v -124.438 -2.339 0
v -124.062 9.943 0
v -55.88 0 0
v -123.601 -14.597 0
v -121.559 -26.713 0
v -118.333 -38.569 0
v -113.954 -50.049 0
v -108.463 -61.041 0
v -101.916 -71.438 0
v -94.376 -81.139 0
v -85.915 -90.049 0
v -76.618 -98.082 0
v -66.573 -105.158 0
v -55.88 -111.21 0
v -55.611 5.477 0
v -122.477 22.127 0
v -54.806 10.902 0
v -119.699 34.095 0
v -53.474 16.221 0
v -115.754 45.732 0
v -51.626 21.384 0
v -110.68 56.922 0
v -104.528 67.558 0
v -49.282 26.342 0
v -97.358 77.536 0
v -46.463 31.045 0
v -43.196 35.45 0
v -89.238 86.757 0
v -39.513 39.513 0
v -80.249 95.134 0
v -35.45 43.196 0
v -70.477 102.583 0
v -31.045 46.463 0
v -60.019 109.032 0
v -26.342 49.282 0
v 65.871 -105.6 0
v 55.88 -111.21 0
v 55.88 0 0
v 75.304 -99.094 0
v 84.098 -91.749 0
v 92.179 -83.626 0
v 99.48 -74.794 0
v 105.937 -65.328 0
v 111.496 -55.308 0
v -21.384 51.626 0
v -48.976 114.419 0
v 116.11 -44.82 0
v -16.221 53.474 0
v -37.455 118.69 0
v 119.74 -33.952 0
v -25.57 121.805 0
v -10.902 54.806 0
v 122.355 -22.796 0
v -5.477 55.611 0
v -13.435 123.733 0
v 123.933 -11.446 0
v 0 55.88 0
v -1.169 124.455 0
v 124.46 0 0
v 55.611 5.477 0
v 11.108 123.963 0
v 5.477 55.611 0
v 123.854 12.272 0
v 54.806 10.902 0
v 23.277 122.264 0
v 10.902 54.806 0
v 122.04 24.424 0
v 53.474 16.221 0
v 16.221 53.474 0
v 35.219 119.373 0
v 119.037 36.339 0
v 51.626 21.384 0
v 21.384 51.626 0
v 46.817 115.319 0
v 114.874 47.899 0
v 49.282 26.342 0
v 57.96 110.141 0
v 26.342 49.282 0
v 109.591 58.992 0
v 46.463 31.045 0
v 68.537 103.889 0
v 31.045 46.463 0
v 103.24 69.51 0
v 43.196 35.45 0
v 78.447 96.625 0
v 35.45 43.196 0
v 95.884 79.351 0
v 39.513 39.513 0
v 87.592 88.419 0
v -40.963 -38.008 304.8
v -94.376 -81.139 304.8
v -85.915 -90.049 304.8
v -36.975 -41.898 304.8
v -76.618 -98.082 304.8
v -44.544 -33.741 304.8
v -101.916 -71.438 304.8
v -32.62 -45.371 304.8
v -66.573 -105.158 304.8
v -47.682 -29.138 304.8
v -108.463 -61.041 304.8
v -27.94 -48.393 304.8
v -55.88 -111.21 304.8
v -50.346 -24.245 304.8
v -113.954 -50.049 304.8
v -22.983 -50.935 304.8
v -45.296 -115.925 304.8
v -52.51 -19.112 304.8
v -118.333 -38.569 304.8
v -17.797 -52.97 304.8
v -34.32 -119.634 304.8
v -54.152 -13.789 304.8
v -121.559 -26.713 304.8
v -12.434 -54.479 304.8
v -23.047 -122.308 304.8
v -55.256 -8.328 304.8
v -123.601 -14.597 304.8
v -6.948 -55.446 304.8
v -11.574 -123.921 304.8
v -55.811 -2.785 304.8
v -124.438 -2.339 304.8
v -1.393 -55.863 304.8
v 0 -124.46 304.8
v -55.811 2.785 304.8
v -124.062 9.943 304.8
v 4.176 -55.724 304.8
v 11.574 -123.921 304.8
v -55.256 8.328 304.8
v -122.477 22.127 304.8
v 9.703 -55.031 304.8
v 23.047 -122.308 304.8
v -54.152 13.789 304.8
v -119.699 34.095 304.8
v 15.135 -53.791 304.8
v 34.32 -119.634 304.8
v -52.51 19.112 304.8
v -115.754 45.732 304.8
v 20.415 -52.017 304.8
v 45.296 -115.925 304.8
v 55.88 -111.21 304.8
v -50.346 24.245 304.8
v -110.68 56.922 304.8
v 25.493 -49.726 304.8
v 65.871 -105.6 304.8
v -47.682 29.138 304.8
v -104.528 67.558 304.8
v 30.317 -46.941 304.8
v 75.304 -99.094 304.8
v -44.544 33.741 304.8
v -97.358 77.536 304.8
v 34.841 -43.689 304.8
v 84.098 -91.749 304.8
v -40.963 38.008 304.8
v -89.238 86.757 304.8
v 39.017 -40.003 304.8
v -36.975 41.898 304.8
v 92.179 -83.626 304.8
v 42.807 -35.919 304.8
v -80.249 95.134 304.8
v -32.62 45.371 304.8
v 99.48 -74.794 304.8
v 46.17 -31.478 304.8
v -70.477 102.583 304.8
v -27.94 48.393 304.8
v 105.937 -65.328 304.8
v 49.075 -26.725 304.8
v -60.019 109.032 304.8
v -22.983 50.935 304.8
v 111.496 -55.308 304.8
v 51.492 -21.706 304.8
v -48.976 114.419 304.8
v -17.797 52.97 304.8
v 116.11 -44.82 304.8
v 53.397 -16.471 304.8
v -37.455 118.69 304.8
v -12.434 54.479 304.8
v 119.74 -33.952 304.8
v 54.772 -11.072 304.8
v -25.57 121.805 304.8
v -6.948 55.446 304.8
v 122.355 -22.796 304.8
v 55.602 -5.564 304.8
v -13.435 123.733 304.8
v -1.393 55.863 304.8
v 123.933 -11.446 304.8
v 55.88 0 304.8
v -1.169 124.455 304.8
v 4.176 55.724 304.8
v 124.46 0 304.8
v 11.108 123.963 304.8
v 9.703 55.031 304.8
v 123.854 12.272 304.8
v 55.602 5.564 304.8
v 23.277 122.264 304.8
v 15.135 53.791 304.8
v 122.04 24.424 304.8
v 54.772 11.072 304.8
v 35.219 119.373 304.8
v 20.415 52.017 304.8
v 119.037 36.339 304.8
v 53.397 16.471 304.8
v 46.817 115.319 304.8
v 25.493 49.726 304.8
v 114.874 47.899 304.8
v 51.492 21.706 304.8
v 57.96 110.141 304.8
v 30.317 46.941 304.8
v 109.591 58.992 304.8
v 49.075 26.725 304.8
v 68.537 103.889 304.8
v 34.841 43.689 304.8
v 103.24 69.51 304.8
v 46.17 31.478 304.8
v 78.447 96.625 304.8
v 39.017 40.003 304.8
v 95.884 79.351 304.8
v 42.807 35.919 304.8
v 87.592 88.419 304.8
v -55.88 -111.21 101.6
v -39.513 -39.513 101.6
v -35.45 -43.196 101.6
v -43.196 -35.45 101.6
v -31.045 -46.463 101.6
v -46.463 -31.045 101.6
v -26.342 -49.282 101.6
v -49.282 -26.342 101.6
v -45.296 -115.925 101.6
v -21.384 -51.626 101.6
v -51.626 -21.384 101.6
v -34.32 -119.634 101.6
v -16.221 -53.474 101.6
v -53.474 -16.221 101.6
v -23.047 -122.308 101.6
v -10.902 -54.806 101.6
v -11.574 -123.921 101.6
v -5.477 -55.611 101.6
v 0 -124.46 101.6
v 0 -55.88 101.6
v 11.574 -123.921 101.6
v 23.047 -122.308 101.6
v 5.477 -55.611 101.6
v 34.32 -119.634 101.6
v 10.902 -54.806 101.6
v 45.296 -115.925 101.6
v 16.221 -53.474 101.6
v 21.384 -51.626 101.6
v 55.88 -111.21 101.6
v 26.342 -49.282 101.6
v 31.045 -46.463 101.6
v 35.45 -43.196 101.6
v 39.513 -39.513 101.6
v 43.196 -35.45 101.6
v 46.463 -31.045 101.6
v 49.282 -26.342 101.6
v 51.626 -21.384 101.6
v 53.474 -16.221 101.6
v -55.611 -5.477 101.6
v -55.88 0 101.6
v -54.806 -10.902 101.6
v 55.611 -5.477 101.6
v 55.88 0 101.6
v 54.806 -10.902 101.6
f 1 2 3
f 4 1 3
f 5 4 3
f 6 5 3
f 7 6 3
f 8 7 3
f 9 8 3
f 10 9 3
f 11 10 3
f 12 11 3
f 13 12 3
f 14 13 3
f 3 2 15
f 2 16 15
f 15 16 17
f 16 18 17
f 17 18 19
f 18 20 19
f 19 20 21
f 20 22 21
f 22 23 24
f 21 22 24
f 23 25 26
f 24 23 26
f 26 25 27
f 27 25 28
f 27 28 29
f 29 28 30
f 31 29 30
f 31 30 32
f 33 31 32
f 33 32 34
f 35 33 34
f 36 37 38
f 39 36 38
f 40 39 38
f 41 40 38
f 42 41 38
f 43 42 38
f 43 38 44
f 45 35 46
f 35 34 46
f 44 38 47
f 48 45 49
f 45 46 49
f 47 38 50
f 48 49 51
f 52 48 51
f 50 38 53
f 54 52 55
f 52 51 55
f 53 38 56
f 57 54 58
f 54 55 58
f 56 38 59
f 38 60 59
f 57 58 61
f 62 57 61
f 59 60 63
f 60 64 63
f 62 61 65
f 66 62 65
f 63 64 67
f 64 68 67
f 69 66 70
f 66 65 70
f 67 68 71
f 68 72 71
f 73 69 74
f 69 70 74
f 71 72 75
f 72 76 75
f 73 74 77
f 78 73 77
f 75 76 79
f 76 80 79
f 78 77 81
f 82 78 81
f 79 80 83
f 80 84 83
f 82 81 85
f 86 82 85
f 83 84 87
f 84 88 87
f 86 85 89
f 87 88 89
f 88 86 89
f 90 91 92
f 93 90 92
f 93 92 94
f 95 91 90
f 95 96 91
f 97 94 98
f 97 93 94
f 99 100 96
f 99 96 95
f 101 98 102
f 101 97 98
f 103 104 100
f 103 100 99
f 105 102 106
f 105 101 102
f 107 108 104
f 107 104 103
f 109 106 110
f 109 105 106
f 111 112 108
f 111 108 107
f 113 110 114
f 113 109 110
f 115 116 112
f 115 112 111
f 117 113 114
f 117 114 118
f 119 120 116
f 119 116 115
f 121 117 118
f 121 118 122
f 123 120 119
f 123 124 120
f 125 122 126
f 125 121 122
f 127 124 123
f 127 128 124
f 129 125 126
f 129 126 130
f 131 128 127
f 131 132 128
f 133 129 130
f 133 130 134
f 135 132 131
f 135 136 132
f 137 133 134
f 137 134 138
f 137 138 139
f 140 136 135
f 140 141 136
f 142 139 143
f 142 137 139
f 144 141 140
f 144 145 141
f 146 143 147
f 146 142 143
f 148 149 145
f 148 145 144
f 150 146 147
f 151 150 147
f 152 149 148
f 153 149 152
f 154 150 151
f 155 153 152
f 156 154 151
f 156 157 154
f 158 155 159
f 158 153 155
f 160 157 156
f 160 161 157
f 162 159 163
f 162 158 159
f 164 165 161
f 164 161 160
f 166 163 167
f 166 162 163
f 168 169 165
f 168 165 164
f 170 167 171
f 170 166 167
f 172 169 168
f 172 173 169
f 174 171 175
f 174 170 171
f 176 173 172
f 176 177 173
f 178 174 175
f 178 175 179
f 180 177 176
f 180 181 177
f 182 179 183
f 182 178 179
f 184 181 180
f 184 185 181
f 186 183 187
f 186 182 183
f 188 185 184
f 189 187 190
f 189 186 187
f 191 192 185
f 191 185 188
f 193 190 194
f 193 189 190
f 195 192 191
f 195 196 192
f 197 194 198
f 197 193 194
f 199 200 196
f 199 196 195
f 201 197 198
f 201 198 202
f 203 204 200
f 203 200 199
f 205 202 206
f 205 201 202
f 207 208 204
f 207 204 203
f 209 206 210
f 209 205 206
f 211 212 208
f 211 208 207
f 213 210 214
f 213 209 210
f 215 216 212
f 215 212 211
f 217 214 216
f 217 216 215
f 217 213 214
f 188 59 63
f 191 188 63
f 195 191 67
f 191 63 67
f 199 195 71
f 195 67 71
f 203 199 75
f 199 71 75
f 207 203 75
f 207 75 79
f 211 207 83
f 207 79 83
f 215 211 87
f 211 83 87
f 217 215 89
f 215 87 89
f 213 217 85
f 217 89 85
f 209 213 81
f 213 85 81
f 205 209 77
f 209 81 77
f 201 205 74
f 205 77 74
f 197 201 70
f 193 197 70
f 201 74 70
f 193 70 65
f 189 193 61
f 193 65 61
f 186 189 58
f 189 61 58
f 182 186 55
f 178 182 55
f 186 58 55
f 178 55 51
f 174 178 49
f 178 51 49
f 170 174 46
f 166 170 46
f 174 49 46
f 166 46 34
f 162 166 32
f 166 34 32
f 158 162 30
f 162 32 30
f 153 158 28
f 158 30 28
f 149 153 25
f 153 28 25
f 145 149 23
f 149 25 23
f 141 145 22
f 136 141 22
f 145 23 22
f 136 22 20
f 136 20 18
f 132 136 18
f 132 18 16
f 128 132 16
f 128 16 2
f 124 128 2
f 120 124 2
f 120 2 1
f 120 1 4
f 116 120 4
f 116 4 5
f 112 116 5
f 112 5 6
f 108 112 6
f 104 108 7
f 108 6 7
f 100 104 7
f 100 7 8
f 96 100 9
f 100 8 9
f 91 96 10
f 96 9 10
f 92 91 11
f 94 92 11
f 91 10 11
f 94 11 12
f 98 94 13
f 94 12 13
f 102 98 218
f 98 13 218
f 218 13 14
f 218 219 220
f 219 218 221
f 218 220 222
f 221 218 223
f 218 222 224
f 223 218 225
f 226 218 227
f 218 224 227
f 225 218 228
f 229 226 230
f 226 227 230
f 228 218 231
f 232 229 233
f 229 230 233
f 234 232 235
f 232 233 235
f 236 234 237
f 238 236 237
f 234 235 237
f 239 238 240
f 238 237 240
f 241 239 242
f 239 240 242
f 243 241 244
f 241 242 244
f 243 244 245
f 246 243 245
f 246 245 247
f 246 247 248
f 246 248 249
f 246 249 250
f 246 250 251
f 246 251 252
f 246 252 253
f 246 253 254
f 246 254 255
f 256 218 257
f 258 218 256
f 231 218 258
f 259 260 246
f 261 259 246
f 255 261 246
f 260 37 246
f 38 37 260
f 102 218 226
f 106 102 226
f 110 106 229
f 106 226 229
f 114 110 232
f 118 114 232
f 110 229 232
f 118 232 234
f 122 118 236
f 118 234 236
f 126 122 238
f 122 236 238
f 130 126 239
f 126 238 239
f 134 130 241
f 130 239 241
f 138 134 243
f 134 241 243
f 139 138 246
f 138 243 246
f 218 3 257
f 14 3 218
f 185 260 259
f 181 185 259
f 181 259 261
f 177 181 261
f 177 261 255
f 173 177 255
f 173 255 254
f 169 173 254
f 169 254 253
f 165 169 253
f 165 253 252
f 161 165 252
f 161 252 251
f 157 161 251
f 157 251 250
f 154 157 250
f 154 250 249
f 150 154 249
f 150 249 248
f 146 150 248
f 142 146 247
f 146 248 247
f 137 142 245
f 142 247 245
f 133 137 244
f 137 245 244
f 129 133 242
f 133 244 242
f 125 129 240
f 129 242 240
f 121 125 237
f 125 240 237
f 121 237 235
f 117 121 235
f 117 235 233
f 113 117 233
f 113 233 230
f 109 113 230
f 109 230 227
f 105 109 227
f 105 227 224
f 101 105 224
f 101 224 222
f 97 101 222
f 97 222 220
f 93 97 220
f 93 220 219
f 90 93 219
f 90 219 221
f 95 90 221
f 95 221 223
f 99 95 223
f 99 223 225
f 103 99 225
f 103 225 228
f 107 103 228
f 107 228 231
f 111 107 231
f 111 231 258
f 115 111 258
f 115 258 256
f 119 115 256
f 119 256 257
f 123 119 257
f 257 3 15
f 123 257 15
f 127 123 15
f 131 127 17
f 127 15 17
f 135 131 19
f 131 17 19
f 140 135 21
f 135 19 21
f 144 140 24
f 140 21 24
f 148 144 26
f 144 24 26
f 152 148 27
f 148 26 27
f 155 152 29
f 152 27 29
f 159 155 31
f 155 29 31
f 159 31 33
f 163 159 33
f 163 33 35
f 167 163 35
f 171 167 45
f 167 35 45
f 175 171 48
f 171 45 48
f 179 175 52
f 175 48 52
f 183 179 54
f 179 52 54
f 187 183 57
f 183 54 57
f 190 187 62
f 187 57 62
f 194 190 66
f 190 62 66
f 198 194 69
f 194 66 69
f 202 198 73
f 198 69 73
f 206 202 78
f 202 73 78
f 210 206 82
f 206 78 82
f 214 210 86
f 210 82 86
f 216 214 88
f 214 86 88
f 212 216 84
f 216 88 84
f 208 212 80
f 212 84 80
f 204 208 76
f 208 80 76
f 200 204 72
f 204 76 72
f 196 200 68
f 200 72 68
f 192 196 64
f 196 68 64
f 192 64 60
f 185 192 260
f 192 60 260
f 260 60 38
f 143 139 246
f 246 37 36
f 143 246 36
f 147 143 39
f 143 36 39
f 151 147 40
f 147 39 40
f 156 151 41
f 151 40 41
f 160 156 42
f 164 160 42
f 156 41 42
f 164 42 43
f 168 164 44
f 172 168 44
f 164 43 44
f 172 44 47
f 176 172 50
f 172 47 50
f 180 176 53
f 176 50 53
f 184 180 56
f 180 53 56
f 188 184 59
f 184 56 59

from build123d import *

# Parameters (mm, degrees)
F1_DEPTH = 304.8
F2_DEPTH = 101.6


with BuildPart() as f1:
    # F0 (on Top) → F1 (new body)
    with BuildSketch(Plane.XY):
        with BuildLine():
            ThreePointArc((55.88, -111.210239), (105.936576, -65.327891), (124.46, 0))
            ThreePointArc((124.46, 0), (-65.327891, 105.936576), (-55.88, -111.210239))
            Line((-55.88, -111.210239), (-55.88, 0))
            ThreePointArc((-55.88, 0), (0, 55.88), (55.88, 0))
            Line((55.88, 0), (55.88, -111.210239))
        make_face()
        with BuildLine():
            Line((-55.88, 0), (-55.88, -111.210239))
            ThreePointArc((-55.88, -111.210239), (0, -124.46), (55.88, -111.210239))
            Line((55.88, -111.210239), (55.88, 0))
            ThreePointArc((55.88, 0), (0, -55.88), (-55.88, 0))
        make_face()
    extrude(amount=F1_DEPTH)

    # F0 (on Top) → F2 (cut)
    with BuildSketch(Plane.XY):
        with BuildLine():
            Line((-55.88, 0), (-55.88, -111.210239))
            ThreePointArc((-55.88, -111.210239), (0, -124.46), (55.88, -111.210239))
            Line((55.88, -111.210239), (55.88, 0))
            ThreePointArc((55.88, 0), (0, -55.88), (-55.88, 0))
        make_face()
    extrude(amount=F2_DEPTH, mode=Mode.SUBTRACT)


solid = f1.part
